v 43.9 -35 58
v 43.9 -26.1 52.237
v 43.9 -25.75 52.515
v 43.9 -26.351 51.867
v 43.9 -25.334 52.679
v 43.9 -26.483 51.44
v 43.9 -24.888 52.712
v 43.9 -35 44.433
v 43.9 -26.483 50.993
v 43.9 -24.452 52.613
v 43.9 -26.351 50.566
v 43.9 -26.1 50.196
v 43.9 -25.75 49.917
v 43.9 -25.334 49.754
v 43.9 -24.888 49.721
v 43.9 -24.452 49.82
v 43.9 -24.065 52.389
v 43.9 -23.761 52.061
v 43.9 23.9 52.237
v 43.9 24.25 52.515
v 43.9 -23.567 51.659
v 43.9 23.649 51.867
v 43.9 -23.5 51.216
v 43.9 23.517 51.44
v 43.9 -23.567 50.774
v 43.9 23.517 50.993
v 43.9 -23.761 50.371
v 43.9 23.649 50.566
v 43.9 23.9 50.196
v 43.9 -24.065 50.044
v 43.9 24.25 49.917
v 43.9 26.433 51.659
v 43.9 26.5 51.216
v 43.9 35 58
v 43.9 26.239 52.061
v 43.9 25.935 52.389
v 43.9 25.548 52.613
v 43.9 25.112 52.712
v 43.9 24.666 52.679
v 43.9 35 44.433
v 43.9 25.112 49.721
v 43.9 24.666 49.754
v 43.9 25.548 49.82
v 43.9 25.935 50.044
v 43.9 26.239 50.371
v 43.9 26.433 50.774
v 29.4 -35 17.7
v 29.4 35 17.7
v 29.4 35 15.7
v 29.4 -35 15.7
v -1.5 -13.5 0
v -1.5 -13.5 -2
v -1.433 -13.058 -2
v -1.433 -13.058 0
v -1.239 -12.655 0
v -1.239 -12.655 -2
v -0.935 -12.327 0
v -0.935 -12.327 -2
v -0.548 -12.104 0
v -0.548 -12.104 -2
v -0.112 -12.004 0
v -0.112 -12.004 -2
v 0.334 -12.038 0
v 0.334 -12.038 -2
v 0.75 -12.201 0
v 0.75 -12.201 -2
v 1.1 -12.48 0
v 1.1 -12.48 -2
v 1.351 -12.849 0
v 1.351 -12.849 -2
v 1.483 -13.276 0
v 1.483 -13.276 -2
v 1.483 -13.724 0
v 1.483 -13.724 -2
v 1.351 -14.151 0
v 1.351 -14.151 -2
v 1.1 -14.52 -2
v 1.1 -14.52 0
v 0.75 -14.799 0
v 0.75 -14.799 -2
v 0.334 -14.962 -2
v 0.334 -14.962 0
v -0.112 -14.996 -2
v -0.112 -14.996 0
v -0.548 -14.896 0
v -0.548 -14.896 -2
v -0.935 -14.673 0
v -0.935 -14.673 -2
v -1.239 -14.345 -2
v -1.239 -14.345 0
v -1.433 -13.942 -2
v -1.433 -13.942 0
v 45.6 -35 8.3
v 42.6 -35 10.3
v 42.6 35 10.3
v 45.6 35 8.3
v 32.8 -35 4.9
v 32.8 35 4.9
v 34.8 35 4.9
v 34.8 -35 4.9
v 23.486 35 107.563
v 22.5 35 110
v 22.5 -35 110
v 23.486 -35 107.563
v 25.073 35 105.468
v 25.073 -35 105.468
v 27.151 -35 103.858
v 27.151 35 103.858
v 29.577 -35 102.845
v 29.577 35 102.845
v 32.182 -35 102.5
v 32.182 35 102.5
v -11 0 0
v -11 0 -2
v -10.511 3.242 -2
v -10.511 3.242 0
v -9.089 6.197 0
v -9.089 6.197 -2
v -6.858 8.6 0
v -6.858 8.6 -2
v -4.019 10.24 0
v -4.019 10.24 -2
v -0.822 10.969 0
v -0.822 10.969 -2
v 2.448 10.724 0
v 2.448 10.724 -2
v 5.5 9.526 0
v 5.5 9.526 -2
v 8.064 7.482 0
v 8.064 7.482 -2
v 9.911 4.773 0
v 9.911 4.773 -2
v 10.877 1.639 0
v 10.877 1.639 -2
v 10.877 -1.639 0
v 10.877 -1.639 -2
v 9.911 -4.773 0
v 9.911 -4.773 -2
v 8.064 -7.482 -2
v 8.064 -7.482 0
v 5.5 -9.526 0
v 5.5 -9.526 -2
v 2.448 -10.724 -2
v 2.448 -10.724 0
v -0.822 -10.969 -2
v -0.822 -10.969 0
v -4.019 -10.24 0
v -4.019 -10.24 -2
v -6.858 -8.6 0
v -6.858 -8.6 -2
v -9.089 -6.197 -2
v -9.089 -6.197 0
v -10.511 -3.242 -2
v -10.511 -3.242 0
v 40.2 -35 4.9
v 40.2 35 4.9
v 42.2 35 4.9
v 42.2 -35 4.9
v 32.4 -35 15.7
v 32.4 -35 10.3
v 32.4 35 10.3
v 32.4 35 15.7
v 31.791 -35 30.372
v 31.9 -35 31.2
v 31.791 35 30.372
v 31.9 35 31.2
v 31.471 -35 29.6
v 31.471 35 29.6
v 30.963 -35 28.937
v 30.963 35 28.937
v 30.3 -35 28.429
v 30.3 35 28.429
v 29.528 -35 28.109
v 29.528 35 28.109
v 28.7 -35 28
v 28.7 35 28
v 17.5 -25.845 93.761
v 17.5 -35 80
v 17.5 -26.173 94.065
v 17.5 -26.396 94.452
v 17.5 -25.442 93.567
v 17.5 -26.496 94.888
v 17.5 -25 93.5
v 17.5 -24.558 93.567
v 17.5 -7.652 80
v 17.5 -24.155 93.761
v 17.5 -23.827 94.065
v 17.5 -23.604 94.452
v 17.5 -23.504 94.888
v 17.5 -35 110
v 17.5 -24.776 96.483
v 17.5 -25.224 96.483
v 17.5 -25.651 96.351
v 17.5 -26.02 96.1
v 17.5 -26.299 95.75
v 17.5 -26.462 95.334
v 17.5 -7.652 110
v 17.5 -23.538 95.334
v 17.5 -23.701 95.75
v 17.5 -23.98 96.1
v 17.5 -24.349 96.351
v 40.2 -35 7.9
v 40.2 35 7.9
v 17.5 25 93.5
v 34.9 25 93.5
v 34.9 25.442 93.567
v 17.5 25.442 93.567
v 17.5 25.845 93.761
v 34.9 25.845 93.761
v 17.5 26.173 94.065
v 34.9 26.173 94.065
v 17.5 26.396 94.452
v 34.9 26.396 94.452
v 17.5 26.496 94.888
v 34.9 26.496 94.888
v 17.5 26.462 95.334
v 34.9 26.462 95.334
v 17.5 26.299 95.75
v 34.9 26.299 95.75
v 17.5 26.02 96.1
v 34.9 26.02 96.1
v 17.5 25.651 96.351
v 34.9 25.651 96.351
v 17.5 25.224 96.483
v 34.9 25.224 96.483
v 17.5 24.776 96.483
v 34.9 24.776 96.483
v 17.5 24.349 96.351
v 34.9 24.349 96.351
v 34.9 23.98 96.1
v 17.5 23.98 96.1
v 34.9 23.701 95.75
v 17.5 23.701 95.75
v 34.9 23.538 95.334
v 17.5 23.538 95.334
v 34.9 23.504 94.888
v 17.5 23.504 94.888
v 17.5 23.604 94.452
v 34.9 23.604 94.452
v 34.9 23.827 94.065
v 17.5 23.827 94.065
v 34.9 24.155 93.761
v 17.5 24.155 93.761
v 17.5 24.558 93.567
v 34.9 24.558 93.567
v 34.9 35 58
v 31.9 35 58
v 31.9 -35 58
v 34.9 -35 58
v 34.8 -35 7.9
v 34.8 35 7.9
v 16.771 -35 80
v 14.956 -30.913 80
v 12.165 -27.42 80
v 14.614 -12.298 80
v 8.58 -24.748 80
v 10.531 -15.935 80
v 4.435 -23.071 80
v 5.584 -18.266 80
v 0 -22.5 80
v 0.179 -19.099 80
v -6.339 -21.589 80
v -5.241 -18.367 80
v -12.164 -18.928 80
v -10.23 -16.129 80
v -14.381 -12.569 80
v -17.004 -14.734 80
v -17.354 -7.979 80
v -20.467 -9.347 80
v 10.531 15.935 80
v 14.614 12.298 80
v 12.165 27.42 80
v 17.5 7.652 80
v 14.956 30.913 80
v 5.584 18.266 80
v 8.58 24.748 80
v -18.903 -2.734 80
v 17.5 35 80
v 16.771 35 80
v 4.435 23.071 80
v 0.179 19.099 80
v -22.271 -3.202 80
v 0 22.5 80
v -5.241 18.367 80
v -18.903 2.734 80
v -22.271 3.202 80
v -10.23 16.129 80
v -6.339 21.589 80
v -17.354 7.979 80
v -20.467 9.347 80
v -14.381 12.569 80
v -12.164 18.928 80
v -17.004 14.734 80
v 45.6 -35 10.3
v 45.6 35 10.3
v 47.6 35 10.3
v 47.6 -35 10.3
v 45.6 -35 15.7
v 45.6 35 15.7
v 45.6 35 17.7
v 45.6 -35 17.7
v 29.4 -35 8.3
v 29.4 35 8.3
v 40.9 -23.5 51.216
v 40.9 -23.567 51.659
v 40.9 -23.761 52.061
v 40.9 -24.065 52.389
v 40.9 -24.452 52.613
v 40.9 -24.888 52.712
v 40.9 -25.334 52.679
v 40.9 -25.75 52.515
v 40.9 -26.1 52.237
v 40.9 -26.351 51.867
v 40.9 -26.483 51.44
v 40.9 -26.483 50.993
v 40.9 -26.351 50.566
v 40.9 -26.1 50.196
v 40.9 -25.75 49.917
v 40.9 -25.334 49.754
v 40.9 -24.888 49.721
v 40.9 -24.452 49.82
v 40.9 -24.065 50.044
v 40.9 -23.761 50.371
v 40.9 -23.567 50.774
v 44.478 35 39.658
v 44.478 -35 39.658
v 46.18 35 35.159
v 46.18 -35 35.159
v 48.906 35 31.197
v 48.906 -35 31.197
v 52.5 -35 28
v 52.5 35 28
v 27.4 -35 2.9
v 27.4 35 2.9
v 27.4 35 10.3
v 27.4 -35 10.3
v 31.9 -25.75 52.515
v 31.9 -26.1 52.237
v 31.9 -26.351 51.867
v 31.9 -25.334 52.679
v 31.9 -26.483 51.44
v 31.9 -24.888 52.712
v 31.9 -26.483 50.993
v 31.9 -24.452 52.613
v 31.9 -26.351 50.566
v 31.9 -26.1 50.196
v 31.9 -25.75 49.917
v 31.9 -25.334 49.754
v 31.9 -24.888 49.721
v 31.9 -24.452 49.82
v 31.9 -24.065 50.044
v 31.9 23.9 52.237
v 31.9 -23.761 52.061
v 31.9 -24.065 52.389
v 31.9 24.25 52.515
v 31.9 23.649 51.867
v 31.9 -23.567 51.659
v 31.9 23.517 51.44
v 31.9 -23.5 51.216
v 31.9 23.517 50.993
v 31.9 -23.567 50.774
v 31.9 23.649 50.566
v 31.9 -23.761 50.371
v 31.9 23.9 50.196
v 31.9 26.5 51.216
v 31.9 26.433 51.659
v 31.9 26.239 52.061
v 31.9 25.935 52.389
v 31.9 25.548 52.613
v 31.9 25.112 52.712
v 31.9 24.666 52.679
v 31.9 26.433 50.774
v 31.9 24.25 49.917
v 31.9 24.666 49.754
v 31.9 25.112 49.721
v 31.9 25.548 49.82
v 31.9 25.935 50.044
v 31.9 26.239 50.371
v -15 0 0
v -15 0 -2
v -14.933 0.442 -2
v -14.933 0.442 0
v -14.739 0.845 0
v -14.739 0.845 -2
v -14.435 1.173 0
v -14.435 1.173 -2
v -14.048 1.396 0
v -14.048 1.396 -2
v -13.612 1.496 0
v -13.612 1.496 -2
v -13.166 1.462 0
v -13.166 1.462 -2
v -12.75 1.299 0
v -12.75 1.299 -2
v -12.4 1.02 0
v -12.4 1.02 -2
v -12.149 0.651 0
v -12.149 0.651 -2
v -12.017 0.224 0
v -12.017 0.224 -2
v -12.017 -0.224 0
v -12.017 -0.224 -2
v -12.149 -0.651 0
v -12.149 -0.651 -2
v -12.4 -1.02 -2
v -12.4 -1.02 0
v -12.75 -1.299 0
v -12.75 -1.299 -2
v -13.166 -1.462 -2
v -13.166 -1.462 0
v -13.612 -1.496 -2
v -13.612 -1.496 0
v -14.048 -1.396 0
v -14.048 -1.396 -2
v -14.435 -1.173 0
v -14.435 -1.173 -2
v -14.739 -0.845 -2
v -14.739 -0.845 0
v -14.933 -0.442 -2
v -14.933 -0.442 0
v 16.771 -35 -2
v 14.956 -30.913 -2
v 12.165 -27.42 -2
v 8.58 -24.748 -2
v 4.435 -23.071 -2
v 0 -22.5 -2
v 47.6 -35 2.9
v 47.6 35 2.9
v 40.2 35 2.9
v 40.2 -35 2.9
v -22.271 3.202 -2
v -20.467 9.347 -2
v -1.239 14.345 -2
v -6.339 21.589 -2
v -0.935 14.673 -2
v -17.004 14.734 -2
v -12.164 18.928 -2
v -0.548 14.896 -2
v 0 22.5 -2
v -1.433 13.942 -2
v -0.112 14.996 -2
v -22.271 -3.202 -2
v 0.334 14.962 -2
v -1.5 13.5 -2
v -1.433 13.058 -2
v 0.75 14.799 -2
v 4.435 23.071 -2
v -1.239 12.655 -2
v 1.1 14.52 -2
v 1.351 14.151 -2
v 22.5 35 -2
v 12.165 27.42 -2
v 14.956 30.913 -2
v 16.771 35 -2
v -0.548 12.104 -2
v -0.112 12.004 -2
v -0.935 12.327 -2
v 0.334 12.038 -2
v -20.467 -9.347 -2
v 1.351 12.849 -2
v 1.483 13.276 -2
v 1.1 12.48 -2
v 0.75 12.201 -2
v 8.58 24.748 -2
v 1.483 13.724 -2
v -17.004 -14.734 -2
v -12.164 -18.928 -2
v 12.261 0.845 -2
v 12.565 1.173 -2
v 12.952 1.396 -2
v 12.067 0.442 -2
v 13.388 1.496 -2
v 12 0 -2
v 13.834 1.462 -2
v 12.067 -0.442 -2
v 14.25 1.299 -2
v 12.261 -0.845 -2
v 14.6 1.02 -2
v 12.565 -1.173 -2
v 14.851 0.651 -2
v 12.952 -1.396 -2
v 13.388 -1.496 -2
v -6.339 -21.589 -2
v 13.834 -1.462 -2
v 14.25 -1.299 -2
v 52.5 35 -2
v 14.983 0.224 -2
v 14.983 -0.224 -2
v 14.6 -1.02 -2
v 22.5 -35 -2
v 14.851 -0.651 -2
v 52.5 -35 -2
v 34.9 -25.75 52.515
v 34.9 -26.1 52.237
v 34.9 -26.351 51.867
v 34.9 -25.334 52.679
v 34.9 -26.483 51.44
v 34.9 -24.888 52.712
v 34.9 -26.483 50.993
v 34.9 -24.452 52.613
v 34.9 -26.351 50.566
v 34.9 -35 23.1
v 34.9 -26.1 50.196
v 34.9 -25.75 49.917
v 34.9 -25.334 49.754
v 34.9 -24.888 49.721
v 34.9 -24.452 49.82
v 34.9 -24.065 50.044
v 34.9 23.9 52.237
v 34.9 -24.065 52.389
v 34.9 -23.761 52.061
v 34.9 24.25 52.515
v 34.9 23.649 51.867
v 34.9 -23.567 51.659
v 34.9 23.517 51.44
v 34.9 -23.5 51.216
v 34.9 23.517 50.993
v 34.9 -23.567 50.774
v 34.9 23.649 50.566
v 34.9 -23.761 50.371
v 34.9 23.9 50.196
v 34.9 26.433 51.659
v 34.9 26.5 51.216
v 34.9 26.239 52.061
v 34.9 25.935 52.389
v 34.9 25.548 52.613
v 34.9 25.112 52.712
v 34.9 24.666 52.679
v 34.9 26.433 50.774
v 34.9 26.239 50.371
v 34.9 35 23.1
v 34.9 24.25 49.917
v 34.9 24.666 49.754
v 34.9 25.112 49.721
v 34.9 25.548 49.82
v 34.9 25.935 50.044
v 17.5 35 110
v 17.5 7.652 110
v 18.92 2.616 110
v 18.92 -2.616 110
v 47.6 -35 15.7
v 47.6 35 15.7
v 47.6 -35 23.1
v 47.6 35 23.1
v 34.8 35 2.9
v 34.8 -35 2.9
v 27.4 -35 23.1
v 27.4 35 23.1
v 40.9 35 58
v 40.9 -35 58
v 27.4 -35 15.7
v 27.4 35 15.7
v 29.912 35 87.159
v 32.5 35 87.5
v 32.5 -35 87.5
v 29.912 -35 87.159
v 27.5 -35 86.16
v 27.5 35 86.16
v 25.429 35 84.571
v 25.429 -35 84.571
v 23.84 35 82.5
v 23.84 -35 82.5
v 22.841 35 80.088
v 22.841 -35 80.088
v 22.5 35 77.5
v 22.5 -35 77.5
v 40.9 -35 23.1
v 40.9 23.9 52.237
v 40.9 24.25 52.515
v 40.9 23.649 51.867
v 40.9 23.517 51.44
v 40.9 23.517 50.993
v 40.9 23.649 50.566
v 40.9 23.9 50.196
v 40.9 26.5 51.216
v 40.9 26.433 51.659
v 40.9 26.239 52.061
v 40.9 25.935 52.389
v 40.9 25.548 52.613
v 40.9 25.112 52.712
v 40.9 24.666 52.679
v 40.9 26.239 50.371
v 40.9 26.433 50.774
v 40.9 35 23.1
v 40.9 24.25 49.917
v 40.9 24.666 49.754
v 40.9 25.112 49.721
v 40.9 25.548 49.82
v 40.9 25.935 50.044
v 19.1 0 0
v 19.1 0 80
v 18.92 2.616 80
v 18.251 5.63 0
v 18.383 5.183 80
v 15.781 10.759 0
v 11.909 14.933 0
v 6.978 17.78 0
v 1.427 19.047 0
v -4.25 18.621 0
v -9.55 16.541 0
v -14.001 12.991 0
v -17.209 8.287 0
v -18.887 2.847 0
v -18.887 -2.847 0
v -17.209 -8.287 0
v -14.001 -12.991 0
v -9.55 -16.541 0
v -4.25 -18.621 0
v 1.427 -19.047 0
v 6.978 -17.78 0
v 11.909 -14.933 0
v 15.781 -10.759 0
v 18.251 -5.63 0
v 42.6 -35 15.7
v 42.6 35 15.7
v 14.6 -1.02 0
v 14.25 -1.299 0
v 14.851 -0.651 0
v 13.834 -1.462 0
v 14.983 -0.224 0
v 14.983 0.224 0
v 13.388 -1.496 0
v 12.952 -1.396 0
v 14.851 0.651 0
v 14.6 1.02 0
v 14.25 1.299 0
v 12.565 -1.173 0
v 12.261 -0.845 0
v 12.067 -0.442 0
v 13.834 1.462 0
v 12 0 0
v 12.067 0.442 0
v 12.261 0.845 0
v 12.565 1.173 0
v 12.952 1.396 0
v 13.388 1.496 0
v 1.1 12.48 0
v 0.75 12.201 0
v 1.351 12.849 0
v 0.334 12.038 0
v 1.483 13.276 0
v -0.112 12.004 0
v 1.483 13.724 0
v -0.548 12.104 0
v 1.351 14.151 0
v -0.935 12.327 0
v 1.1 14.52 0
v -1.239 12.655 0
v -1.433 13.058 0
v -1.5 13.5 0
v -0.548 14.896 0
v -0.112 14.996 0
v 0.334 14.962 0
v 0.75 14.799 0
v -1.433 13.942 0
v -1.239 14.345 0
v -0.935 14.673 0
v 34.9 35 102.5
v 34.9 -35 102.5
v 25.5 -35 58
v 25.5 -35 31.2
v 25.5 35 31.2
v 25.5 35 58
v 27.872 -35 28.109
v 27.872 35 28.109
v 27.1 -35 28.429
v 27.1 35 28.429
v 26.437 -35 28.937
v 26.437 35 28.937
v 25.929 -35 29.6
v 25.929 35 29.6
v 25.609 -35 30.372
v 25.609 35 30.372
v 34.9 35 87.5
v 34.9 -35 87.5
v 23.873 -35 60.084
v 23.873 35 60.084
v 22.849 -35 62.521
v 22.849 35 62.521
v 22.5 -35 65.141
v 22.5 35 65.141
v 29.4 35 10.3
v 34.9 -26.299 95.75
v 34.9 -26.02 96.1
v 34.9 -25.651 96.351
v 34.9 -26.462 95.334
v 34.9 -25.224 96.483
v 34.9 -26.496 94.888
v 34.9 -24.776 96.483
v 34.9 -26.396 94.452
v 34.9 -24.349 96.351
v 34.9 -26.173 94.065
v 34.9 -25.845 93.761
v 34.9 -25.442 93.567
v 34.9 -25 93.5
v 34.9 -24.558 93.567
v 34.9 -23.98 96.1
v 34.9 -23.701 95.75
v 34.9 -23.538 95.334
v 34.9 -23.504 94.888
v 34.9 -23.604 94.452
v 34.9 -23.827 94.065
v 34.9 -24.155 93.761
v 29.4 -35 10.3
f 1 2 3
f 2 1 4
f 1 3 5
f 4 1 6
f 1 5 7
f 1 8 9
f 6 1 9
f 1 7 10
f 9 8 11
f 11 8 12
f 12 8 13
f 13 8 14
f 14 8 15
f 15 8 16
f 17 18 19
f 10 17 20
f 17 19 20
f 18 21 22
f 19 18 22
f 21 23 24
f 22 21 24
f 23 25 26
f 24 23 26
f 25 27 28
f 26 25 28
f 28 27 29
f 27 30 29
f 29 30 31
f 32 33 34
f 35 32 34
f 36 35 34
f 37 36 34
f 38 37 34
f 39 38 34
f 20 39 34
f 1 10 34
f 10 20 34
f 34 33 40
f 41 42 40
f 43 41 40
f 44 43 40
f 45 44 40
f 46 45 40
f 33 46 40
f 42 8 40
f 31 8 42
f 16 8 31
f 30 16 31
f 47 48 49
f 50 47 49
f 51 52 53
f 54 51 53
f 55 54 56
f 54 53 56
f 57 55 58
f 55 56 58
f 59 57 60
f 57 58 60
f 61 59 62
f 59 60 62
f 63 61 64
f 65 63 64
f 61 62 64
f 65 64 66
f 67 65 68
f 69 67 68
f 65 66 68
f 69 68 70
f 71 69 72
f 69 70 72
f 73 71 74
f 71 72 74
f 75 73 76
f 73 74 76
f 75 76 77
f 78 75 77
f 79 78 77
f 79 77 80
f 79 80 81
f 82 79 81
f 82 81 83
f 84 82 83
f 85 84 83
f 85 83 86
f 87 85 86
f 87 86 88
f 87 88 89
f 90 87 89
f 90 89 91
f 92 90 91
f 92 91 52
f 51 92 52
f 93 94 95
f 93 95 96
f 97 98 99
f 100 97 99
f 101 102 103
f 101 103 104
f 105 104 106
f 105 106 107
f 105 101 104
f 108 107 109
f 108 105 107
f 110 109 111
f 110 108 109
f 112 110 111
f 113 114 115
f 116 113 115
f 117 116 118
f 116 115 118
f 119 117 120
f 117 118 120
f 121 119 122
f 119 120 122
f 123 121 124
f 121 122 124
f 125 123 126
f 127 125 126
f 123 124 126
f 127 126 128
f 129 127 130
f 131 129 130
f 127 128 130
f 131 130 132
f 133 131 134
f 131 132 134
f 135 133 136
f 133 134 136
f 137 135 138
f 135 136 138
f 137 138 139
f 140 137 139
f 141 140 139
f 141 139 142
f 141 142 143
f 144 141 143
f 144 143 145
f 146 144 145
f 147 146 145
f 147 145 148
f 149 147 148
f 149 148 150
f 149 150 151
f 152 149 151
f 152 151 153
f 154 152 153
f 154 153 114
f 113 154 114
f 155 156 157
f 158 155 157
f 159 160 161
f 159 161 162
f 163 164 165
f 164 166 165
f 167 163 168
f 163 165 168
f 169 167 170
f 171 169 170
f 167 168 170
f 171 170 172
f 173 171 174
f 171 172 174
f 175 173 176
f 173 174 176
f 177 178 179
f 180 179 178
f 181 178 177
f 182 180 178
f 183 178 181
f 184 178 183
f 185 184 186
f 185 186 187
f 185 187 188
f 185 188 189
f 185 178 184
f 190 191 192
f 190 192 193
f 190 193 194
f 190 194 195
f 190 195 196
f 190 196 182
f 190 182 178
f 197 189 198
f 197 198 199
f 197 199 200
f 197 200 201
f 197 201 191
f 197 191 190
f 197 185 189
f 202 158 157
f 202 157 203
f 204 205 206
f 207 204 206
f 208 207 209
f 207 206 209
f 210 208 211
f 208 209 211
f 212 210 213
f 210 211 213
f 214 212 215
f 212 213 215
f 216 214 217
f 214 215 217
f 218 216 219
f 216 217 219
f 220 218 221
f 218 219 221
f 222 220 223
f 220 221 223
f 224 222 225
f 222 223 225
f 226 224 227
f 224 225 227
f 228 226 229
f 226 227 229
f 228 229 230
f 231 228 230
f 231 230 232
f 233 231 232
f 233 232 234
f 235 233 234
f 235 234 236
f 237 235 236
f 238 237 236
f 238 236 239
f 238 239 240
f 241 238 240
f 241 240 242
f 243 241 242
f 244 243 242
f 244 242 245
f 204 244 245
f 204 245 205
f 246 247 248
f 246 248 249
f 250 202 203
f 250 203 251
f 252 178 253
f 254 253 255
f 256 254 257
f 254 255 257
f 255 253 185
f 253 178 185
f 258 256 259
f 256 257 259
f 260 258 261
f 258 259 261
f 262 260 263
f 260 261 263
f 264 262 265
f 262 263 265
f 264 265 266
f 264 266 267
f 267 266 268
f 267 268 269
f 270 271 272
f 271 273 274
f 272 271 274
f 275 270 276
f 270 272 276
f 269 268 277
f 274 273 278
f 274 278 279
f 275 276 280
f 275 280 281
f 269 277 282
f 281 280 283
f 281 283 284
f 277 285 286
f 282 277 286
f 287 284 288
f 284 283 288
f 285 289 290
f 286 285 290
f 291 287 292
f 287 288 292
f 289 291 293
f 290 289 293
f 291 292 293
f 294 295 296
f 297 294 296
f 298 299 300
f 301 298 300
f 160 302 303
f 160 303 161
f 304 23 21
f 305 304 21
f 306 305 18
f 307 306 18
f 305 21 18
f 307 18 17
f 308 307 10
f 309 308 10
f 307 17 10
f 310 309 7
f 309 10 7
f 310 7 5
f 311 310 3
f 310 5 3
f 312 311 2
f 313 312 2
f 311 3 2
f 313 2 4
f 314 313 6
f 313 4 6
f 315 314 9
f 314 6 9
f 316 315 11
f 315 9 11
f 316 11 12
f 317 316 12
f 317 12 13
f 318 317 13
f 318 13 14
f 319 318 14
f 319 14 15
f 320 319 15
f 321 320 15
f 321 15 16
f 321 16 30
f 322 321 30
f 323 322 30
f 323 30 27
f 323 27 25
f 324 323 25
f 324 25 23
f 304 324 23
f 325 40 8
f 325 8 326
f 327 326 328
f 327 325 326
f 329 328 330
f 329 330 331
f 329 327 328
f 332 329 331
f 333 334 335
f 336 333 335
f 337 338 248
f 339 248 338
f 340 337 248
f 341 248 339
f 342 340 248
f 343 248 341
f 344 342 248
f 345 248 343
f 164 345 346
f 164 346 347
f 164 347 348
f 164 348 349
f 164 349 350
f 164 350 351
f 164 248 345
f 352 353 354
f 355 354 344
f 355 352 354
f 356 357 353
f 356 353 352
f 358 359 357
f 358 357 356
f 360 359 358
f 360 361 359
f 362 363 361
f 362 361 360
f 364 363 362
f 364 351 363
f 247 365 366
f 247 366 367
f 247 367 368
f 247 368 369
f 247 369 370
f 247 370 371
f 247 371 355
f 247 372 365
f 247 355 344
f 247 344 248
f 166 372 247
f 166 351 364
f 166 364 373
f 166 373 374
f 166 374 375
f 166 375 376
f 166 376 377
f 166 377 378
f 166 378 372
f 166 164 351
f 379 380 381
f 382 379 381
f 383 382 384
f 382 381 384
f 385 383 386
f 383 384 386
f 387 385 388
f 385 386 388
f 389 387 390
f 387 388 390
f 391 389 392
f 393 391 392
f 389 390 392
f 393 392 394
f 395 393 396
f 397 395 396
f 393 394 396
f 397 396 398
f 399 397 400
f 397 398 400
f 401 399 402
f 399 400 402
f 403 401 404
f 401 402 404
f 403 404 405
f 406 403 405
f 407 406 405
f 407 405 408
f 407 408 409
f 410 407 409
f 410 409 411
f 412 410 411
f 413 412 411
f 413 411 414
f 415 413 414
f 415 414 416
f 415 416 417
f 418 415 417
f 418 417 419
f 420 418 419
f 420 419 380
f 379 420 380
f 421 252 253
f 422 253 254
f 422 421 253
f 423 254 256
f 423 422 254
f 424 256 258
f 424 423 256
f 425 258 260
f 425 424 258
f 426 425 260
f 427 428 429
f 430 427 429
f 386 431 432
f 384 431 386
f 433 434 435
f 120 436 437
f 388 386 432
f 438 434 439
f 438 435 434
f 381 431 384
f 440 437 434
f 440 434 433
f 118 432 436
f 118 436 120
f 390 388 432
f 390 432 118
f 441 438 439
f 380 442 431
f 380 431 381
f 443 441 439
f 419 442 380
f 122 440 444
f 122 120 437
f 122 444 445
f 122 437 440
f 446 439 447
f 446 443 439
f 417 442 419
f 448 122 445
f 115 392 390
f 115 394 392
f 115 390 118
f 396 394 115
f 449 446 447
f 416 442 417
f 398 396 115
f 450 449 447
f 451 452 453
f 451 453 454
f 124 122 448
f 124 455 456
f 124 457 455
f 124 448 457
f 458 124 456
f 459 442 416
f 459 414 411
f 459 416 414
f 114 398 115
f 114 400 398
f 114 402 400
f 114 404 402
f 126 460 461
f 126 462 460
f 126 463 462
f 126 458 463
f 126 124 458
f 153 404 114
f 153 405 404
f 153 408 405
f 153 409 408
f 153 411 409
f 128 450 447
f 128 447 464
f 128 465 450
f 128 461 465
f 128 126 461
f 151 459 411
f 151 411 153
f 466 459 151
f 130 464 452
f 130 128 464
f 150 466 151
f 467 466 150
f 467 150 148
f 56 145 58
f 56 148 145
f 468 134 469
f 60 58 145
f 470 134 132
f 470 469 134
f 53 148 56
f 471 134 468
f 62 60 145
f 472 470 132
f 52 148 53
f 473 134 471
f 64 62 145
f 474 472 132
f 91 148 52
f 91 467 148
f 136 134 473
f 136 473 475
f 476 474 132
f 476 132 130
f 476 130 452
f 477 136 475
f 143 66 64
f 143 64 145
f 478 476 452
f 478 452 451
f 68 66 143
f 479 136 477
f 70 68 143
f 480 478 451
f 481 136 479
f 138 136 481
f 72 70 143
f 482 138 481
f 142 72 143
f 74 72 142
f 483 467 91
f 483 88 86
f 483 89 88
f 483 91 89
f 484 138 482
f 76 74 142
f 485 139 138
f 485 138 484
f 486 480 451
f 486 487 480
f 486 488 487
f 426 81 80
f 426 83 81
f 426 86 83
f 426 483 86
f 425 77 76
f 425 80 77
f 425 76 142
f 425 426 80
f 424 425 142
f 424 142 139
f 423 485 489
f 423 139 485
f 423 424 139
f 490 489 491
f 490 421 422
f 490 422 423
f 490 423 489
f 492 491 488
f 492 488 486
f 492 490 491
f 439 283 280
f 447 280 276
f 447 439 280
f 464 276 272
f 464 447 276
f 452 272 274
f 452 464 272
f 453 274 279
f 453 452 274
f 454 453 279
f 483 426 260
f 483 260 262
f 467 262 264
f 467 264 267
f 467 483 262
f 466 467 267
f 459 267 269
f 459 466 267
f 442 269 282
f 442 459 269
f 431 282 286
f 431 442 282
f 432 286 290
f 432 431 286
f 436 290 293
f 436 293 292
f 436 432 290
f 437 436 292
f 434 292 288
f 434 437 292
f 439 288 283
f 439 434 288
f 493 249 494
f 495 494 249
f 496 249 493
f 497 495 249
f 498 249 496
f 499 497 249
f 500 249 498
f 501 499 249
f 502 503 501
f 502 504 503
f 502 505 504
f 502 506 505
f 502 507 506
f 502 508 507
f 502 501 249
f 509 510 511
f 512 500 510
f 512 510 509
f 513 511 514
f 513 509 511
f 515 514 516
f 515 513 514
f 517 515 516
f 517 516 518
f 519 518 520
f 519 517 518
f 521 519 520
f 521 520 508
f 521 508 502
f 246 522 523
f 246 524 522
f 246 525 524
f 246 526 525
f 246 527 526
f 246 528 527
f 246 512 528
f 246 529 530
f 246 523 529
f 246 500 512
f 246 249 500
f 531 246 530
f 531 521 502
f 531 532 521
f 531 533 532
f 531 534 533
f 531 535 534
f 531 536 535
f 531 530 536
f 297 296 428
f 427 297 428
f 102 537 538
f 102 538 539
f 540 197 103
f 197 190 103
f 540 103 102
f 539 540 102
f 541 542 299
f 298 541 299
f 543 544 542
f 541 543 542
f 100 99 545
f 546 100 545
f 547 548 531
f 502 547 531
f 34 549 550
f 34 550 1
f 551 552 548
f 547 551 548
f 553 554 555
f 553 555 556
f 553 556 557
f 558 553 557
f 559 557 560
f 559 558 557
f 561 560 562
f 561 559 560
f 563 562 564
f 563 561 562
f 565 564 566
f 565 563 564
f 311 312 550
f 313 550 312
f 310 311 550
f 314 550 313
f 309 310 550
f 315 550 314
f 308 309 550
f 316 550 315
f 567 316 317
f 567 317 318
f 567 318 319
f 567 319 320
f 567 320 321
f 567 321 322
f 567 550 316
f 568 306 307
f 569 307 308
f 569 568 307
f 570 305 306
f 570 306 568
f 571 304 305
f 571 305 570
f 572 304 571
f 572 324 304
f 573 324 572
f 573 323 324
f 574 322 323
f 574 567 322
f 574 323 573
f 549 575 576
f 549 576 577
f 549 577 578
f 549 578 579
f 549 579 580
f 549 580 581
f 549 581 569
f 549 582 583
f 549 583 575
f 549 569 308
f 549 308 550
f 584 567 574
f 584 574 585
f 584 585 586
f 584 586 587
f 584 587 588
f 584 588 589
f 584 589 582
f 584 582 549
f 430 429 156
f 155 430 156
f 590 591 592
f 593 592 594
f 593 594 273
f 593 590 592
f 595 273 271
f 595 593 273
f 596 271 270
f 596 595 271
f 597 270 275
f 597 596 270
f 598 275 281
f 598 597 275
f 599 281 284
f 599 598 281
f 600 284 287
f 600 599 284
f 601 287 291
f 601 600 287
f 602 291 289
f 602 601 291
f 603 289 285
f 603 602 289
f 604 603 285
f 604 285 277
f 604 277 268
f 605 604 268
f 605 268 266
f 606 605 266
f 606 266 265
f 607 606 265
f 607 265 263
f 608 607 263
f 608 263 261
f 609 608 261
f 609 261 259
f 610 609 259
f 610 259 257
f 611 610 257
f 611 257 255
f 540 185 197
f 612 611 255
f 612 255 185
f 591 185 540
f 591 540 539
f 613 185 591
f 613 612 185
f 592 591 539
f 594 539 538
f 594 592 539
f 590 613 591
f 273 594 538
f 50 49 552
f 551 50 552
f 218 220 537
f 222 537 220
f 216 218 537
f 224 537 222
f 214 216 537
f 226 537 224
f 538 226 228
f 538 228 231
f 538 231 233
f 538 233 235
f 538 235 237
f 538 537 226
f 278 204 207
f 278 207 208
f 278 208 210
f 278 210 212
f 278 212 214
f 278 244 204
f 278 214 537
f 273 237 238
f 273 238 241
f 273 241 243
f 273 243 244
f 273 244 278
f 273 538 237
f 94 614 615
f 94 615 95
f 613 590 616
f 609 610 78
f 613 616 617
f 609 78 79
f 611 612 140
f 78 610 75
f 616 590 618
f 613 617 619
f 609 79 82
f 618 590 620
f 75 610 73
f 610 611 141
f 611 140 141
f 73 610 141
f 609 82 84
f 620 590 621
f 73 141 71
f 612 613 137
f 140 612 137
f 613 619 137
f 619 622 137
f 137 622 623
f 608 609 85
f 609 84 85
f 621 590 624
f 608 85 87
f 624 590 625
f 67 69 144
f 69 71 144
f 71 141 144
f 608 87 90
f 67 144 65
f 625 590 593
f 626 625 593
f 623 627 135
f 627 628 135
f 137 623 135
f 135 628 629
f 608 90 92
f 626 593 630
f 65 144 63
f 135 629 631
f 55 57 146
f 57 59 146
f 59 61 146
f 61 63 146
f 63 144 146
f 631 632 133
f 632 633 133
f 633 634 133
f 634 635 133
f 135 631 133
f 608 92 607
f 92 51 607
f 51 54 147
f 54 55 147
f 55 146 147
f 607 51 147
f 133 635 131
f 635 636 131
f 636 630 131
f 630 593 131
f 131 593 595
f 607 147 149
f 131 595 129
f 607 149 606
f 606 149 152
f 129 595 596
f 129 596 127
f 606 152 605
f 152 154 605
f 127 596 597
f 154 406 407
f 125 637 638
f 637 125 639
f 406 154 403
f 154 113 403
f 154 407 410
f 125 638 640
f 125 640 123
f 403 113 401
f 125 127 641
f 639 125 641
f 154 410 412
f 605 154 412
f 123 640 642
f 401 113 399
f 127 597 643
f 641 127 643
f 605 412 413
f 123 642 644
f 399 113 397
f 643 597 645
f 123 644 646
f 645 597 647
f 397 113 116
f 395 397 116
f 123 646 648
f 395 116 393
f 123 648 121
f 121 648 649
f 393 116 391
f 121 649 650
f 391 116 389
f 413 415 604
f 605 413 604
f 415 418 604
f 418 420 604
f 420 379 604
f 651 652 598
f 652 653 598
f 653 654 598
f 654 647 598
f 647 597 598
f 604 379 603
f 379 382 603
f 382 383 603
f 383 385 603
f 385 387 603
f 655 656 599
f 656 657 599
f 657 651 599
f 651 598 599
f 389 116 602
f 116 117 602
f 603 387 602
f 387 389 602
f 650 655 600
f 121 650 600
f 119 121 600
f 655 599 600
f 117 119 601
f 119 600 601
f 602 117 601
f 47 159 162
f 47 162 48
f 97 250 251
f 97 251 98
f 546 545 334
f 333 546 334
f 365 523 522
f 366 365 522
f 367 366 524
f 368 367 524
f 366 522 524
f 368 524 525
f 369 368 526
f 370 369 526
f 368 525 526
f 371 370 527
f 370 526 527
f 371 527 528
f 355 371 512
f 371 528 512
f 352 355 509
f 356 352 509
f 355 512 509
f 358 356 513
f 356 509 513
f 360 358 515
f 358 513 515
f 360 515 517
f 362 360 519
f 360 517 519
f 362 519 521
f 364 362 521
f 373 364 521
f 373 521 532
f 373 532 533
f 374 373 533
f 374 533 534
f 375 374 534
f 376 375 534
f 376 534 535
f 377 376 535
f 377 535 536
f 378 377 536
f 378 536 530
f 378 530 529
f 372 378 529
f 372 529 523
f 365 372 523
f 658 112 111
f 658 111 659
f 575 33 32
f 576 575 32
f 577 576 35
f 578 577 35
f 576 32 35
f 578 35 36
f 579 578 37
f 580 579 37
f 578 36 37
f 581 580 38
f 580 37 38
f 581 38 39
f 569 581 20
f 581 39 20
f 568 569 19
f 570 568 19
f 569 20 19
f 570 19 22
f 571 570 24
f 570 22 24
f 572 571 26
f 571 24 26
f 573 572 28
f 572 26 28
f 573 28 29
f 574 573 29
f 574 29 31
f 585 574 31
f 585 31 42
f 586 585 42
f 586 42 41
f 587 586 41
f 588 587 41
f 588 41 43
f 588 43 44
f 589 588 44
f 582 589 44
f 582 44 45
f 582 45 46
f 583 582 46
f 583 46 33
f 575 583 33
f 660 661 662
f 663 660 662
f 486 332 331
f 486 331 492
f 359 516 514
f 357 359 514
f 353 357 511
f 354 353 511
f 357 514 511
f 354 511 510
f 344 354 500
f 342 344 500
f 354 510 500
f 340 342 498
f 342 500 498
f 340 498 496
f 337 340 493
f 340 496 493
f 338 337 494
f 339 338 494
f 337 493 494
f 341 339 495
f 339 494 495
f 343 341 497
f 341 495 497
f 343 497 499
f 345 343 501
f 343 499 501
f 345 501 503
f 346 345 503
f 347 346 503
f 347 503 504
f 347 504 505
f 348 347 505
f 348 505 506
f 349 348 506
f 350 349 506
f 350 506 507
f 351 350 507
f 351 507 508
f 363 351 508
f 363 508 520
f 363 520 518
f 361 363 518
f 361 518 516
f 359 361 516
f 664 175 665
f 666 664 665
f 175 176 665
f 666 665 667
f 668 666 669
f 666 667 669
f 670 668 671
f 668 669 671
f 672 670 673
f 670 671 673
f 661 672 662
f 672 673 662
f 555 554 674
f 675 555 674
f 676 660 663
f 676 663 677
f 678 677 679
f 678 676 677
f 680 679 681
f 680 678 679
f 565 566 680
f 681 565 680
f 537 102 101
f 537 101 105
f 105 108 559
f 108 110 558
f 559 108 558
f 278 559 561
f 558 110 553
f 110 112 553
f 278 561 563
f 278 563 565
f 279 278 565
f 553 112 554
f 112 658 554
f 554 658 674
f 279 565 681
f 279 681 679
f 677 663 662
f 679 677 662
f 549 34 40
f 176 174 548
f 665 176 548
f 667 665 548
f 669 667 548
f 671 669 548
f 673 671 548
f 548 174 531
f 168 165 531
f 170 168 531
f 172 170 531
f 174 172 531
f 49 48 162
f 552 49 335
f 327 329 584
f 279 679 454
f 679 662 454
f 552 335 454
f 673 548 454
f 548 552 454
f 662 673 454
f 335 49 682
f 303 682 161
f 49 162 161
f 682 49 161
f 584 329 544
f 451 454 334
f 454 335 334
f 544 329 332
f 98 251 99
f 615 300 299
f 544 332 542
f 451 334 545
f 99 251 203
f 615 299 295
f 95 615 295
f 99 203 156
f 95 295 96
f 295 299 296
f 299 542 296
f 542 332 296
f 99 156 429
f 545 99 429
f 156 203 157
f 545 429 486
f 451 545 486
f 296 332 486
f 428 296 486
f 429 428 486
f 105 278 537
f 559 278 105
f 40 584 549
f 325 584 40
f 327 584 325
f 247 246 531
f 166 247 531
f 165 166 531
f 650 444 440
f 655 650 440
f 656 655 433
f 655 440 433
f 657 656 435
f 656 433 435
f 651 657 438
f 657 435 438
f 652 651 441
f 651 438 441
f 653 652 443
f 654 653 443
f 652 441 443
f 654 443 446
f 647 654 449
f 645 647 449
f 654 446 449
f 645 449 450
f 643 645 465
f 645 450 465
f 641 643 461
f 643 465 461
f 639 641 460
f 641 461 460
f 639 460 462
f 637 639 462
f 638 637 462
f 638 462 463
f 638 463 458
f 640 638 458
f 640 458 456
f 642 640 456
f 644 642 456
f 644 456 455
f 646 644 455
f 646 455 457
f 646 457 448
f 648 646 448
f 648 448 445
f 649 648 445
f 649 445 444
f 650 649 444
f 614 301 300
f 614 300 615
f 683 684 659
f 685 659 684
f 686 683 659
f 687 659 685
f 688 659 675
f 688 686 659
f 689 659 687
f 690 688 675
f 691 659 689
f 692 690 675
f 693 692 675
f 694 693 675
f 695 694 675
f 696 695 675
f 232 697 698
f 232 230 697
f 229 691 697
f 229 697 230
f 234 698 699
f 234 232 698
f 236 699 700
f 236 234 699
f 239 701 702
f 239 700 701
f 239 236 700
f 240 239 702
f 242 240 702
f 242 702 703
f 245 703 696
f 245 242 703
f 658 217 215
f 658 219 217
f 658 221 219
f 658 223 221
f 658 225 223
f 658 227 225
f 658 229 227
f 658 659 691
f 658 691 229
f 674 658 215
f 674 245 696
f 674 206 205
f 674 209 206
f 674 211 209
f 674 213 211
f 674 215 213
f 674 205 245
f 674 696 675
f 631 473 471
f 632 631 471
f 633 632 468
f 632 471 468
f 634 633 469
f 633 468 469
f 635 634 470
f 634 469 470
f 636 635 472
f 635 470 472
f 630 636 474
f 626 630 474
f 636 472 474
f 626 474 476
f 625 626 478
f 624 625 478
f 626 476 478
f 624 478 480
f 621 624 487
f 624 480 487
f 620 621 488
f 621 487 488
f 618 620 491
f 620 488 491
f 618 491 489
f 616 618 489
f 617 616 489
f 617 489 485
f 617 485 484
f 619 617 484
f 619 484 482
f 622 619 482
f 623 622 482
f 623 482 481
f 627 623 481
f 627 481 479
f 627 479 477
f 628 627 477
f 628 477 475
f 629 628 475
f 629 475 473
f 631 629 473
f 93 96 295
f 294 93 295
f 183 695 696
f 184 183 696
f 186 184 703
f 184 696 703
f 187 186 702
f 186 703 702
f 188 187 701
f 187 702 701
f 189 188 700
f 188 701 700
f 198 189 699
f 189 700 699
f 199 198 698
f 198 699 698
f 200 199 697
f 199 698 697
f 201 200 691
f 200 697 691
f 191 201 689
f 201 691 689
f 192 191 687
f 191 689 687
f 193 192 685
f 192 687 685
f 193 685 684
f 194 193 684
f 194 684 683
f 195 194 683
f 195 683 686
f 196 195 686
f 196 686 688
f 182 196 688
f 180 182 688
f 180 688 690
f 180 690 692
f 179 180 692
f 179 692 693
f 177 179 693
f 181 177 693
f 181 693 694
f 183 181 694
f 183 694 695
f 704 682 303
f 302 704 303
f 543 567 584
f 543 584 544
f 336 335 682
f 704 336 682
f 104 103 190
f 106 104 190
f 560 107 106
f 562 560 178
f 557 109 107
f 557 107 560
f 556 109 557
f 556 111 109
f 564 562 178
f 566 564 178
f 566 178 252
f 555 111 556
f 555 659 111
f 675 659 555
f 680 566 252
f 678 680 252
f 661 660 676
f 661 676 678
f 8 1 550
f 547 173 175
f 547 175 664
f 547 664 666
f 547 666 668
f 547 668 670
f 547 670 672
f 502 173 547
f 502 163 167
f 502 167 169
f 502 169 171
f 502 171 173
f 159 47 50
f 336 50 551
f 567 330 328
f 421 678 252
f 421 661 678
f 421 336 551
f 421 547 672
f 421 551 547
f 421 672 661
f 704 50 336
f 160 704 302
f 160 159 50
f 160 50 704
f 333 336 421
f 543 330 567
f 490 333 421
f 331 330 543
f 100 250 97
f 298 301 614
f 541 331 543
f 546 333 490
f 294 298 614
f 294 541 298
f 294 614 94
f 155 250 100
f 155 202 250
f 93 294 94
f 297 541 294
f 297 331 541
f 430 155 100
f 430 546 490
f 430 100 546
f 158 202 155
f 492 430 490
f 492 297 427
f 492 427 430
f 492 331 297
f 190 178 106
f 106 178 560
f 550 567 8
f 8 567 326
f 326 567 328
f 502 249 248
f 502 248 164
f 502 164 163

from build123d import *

# Parameters (mm, degrees)
SKETCH4_R            = 19.1
BOSS_EXTRUDE4_DEPTH  = 80
BOSS_EXTRUDE5_START  = 2
BOSS_EXTRUDE5_DEPTH  = 2
SKETCH6_R            = 5
CUT_EXTRUDE1_DEPTH   = 2
BOSS_EXTRUDE7_DEPTH  = 30
SKETCH8_R            = 11
CUT_EXTRUDE2_DEPTH   = 30
SKETCH9_R            = 1.5
CUT_EXTRUDE3_DEPTH   = 30
SKETCH11_W           = 5
SKETCH11_H           = 112
BOSS_EXTRUDE8_DEPTH  = 20
SKETCH12_W           = 5
SKETCH12_H           = 112
BOSS_EXTRUDE9_DEPTH  = 20
SKETCH13_R           = 1.5
CUT_EXTRUDE4_DEPTH   = 20
SKETCH14_R           = 1.5
CUT_EXTRUDE5_DEPTH   = 20
SKETCH16_W           = 30
SKETCH16_H           = 70
BOSS_EXTRUDE10_DEPTH = 30
SKETCH21_W           = 6
SKETCH21_H           = 4.9
CUT_EXTRUDE6_DEPTH   = 70
SKETCH23_W           = 3
SKETCH23_H           = 70
BOSS_EXTRUDE11_DEPTH = 30
FILLET5_R            = 3.2
FILLET6_R            = 20
SKETCH26_W           = 112
SKETCH26_H           = 40
CUT_EXTRUDE10_DEPTH  = 15
SKETCH27_W           = 6.865199721
SKETCH27_H           = 6.850856093
SKETCH27_W_2         = 7.923200186
SKETCH27_H_2         = 5.884780205
CUT_EXTRUDE11_DEPTH  = 131.000961535
SKETCH28_W           = 12.4
SKETCH28_H           = 15
BOSS_EXTRUDE12_DEPTH = 70
FILLET7_R            = 10
SKETCH29_R           = 1.5
CUT_EXTRUDE12_DEPTH  = 129.917648132
SKETCH30_R           = 1.5
CUT_EXTRUDE13_DEPTH  = 15
FILLET8_R            = 10


# Some blends are built 0.0001 mm under size
with BuildPart() as part:
    # Sketch4 → Boss-Extrude4 (new body)
    with BuildSketch(Plane.XY):
        with BuildLine():
            Line((22.5, 0), (22.5, -60))
            Line((22.5, -60), (17.5, -60))
            Line((17.5, -60), (17.5, -40))
            ThreePointArc((17.5, -40), (12.374368671, -27.625631329), (0, -22.5))
            ThreePointArc((0, -22.5), (-22.5, 0), (0, 22.5))
            ThreePointArc((0, 22.5), (12.374368671, 27.625631329), (17.5, 40))
            Line((17.5, 40), (17.5, 60))
            Line((17.5, 60), (22.5, 60))
            Line((22.5, 60), (22.5, 0))
        make_face()
        Circle(SKETCH4_R, mode=Mode.SUBTRACT)
    extrude(amount=BOSS_EXTRUDE4_DEPTH)

    # Sketch5 → Boss-Extrude5 (add)
    with BuildSketch(Plane(origin=(0, 0, 0), x_dir=(-1, 0, 0), z_dir=(0, 0, -1)).offset(BOSS_EXTRUDE5_START)):
        with BuildLine():
            Line((-17.5, 60), (-22.5, 60))
            Line((-22.5, 60), (-22.5, -60))
            Line((-22.5, -60), (-17.5, -60))
            Line((-17.5, -60), (-17.5, -40))
            ThreePointArc((-17.5, -40), (-12.374368671, -27.625631329), (0, -22.5))
            ThreePointArc((0, -22.5), (22.5, 0), (0, 22.5))
            ThreePointArc((0, 22.5), (-12.374368671, 27.625631329), (-17.5, 40))
            Line((-17.5, 40), (-17.5, 60))
        make_face()
    extrude(amount=-BOSS_EXTRUDE5_DEPTH)

    # Sketch6 → Cut-Extrude1 (cut)
    with BuildSketch(Plane(origin=(0, 0, -2), x_dir=(-1, 0, 0), z_dir=(0, 0, -1))):
        Circle(SKETCH6_R)
    extrude(amount=-CUT_EXTRUDE1_DEPTH, mode=Mode.SUBTRACT)

    # Sketch7 → Boss-Extrude7 (add)
    with BuildSketch(Plane.XY.offset(80)):
        with BuildLine():
            Line((17.5, 60), (17.5, 7.652450588))
            ThreePointArc((17.5, 7.652450588), (19.1, 0), (17.5, -7.652450588))
            Line((17.5, -7.652450588), (17.5, -60))
            Line((17.5, -60), (22.5, -60))
            Line((22.5, -60), (22.5, 60))
            Line((22.5, 60), (17.5, 60))
        make_face()
    extrude(amount=BOSS_EXTRUDE7_DEPTH)

    # Sketch8 → Cut-Extrude2 (cut)
    with BuildSketch(Plane(origin=(0, 0, -2), x_dir=(-1, 0, 0), z_dir=(0, 0, -1))):
        Circle(SKETCH8_R)
    extrude(amount=-CUT_EXTRUDE2_DEPTH, mode=Mode.SUBTRACT)

    # Sketch9 → Cut-Extrude3 (cut)
    with BuildSketch(Plane(origin=(0, 0, -2), x_dir=(-1, 0, 0), z_dir=(0, 0, -1))):
        with Locations((0, 13.5)):
            Circle(SKETCH9_R)
        with Locations((13.5, 0)):
            Circle(SKETCH9_R)
        with Locations((0, -13.5)):
            Circle(SKETCH9_R)
        with Locations((-13.5, 0)):
            Circle(SKETCH9_R)
    extrude(amount=-CUT_EXTRUDE3_DEPTH, mode=Mode.SUBTRACT)

    # Sketch11 → Boss-Extrude8 (add)
    with BuildSketch(Plane.XZ.offset(60)):
        with Locations((20, 54)):
            Rectangle(SKETCH11_W, SKETCH11_H)
    extrude(amount=BOSS_EXTRUDE8_DEPTH)

    # Sketch12 → Boss-Extrude9 (add)
    with BuildSketch(Plane(origin=(0, 60, 0), x_dir=(1, 0, 0), z_dir=(0, 1, 0))):
        with Locations((20, -54)):
            Rectangle(SKETCH12_W, SKETCH12_H)
    extrude(amount=BOSS_EXTRUDE9_DEPTH)

    # Sketch13 → Cut-Extrude4 (cut)
    with BuildSketch(Plane.ZY.offset(-17.5)):
        with Locations((26, 60)):
            Circle(SKETCH13_R)
        with Locations((54, 60)):
            Circle(SKETCH13_R)
        with Locations((82, 60)):
            Circle(SKETCH13_R)
        with Locations((82, -60)):
            Circle(SKETCH13_R)
        with Locations((54, -60)):
            Circle(SKETCH13_R)
        with Locations((26, -60)):
            Circle(SKETCH13_R)
    extrude(amount=-CUT_EXTRUDE4_DEPTH, mode=Mode.SUBTRACT)

    # Sketch14 → Cut-Extrude5 (cut)
    with BuildSketch(Plane.ZY.offset(-17.5)):
        with Locations((95, 37.652450588)):
            Circle(SKETCH14_R)
        with Locations((95, -37.652450588)):
            Circle(SKETCH14_R)
    extrude(amount=-CUT_EXTRUDE5_DEPTH, mode=Mode.SUBTRACT)

    # Sketch16 → Boss-Extrude10 (add)
    with BuildSketch(Plane(origin=(22.5, 0, 0), x_dir=(0, 0, -1), z_dir=(1, 0, 0))):
        with Locations((-13, 0)):
            Rectangle(SKETCH16_W, SKETCH16_H)
    extrude(amount=BOSS_EXTRUDE10_DEPTH)

    # Sketch21 → Cut-Extrude6 (cut)
    with BuildSketch(Plane(origin=(0, 35, 0), x_dir=(1, 0, 0), z_dir=(0, 1, 0))):
        Polygon((34.8, -2.9), (27.4, -2.9), (27.4, -10.3), (29.4, -10.3), (29.4, -8.3), (32.4, -10.3), (32.4, -15.7), (29.4, -17.7), (29.4, -15.7), (27.4, -15.7), (27.4, -23.1), (34.9, -23.1), (40.9, -23.1), (47.6, -23.1), (47.6, -15.7), (45.6, -15.7), (45.6, -17.7), (42.6, -15.7), (42.6, -10.3), (45.6, -8.3), (45.6, -10.3), (47.6, -10.3), (47.6, -2.9), (40.2, -2.9), (40.2, -4.9), (42.2, -4.9), (40.2, -7.9), (34.8, -7.9), (32.8, -4.9), (34.8, -4.9), align=None)
        with Locations((37.9, -25.55)):
            Rectangle(SKETCH21_W, SKETCH21_H)
    extrude(amount=-CUT_EXTRUDE6_DEPTH, mode=Mode.SUBTRACT)

    # Sketch23 → Boss-Extrude11 (add)
    with BuildSketch(Plane.XY.offset(28)):
        with Locations((42.4, 0)):
            Rectangle(SKETCH23_W, SKETCH23_H)
        with Locations((24, 0)):
            Rectangle(SKETCH23_W, SKETCH23_H)
        with Locations((33.4, 0)):
            Rectangle(SKETCH23_W, SKETCH23_H)
    extrude(amount=BOSS_EXTRUDE11_DEPTH)

    # Fillet5
    fillet5_edges = [part.edges().sort_by_distance(p)[0] for p in [
        (25.5, 0, 28),
        (31.9, 0, 28),
    ]]
    fillet(fillet5_edges, radius=FILLET5_R - 0.0001)  # a hair under: the kernel refuses the full size

    # Fillet6
    # the kernel refuses this fillet: 20 mm, written as the material it adds along each edge
    with BuildSketch(Plane(origin=(43.9, 35, 28), x_dir=(1, 0, 0), z_dir=(0, -1, 0))) as fillet6_piece_1:
        with BuildLine():
            CenterArc((20, 16.432893841), FILLET6_R, 180, 55.249774246)
            Line((0, 16.432893841), (-0.4, 16.432893841))
            Line((-0.4, 16.432893841), (-0.4, 0))
            Line((-0.4, 0), (0, -0.4))
            ThreePointArc((0, -0.4), (4.3, -0.4), (8.372, -0.328657877))
            Line((8.372, -0.328657877), (8.6, 0))
        make_face()
    extrude(amount=70)

    # Sketch26 → Cut-Extrude10 (cut)
    with BuildSketch(Plane.ZY.offset(-17.5)):
        with Locations((54, -60)):
            Rectangle(SKETCH26_W, SKETCH26_H)
        with Locations((54, 60)):
            Rectangle(SKETCH26_W, SKETCH26_H)
    extrude(amount=-CUT_EXTRUDE10_DEPTH, mode=Mode.SUBTRACT)

    # Sketch27 → Cut-Extrude11 (cut, through all)
    with BuildSketch(Plane(origin=(0, 0, -2), x_dir=(-1, 0, 0), z_dir=(0, 0, -1))):
        with Locations((-19.06740014, 38.425428047)):
            Rectangle(SKETCH27_W, SKETCH27_H)
        with Locations((-18.538399907, -37.942390102)):
            Rectangle(SKETCH27_W_2, SKETCH27_H_2)
    extrude(amount=-CUT_EXTRUDE11_DEPTH, mode=Mode.SUBTRACT)

    # Sketch28 → Boss-Extrude12 (add)
    with BuildSketch(Plane(origin=(0, 35, 0), x_dir=(1, 0, 0), z_dir=(0, 1, 0))):
        with Locations((28.7, -95)):
            Rectangle(SKETCH28_W, SKETCH28_H)
    extrude(amount=-BOSS_EXTRUDE12_DEPTH)

    # Fillet7
    # the kernel refuses this fillet: 10 mm, written as the material it adds along each edge
    with BuildSketch(Plane(origin=(22.5, 35, 102.5), x_dir=(0, 0, 1), z_dir=(0, -1, 0))) as fillet7_piece_1:
        with BuildLine():
            CenterArc((10, -9.682458366), FILLET7_R, 104.477512186, 75.522487814)
            Line((0, -9.682458366), (-0.2, -9.682458366))
            Line((-0.2, -9.682458366), (-0.2, 0))
            Line((-0.2, 0), (0, 0.2))
            ThreePointArc((0, 0.2), (3.75, 0.2), (7.45, 0.193649167))
            Line((7.45, 0.193649167), (7.5, 0))
        make_face()
    extrude(amount=70)
    with BuildSketch(Plane(origin=(22.5, 35, 87.5), x_dir=(0, 0, -1), z_dir=(0, -1, 0))) as fillet7_piece_2:
        with BuildLine():
            CenterArc((FILLET7_R, FILLET7_R), FILLET7_R, 180, 90)
            Line((0, FILLET7_R), (-FILLET7_R * 0.02, FILLET7_R))
            Line((-FILLET7_R * 0.02, FILLET7_R), (-FILLET7_R * 0.02, -FILLET7_R * 0.02))
            Line((-FILLET7_R * 0.02, -FILLET7_R * 0.02), (FILLET7_R, -FILLET7_R * 0.02))
            Line((FILLET7_R, -FILLET7_R * 0.02), (FILLET7_R, 0))
        make_face()
    extrude(amount=70)

    # Sketch29 → Cut-Extrude12 (cut, through all)
    with BuildSketch(Plane(origin=(34.9, 0, 0), x_dir=(0, 0, -1), z_dir=(1, 0, 0))):
        with Locations((-95, 25)):
            Circle(SKETCH29_R)
        with Locations((-95, -25)):
            Circle(SKETCH29_R)
    extrude(amount=-CUT_EXTRUDE12_DEPTH, mode=Mode.SUBTRACT)

    # Sketch30 → Cut-Extrude13 (cut)
    with BuildSketch(Plane(origin=(43.9, 0, 0), x_dir=(0, 0, -1), z_dir=(1, 0, 0))):
        with Locations(Location((-51.216446921, 25, 0), (0, 0, 90))):
            Circle(SKETCH30_R)
        with Locations(Location((-51.216446921, -25, 0), (0, 0, 90))):
            Circle(SKETCH30_R)
    extrude(amount=-CUT_EXTRUDE13_DEPTH, mode=Mode.SUBTRACT)

    # Fillet8
    # the kernel refuses this fillet: 10 mm, written as the material it adds along each edge
    with BuildSketch(Plane(origin=(22.5, -35, 58), x_dir=(0, 0, 1), z_dir=(0, 1, 0))) as fillet8_piece_1:
        with BuildLine():
            CenterArc((7.141428429, 10), FILLET8_R, 224.427004001, 45.572995999)
            Line((0, 3), (-0.142828569, 2.86))
            ThreePointArc((-0.142828569, 2.86), (-0.2, 1.5), (-0.2, 0))
            Line((-0.2, 0), (0, -0.2))
            Line((0, -0.2), (7.141428429, -0.2))
            Line((7.141428429, -0.2), (7.141428429, 0))
        make_face()
    extrude(amount=70)


solid = part.part
